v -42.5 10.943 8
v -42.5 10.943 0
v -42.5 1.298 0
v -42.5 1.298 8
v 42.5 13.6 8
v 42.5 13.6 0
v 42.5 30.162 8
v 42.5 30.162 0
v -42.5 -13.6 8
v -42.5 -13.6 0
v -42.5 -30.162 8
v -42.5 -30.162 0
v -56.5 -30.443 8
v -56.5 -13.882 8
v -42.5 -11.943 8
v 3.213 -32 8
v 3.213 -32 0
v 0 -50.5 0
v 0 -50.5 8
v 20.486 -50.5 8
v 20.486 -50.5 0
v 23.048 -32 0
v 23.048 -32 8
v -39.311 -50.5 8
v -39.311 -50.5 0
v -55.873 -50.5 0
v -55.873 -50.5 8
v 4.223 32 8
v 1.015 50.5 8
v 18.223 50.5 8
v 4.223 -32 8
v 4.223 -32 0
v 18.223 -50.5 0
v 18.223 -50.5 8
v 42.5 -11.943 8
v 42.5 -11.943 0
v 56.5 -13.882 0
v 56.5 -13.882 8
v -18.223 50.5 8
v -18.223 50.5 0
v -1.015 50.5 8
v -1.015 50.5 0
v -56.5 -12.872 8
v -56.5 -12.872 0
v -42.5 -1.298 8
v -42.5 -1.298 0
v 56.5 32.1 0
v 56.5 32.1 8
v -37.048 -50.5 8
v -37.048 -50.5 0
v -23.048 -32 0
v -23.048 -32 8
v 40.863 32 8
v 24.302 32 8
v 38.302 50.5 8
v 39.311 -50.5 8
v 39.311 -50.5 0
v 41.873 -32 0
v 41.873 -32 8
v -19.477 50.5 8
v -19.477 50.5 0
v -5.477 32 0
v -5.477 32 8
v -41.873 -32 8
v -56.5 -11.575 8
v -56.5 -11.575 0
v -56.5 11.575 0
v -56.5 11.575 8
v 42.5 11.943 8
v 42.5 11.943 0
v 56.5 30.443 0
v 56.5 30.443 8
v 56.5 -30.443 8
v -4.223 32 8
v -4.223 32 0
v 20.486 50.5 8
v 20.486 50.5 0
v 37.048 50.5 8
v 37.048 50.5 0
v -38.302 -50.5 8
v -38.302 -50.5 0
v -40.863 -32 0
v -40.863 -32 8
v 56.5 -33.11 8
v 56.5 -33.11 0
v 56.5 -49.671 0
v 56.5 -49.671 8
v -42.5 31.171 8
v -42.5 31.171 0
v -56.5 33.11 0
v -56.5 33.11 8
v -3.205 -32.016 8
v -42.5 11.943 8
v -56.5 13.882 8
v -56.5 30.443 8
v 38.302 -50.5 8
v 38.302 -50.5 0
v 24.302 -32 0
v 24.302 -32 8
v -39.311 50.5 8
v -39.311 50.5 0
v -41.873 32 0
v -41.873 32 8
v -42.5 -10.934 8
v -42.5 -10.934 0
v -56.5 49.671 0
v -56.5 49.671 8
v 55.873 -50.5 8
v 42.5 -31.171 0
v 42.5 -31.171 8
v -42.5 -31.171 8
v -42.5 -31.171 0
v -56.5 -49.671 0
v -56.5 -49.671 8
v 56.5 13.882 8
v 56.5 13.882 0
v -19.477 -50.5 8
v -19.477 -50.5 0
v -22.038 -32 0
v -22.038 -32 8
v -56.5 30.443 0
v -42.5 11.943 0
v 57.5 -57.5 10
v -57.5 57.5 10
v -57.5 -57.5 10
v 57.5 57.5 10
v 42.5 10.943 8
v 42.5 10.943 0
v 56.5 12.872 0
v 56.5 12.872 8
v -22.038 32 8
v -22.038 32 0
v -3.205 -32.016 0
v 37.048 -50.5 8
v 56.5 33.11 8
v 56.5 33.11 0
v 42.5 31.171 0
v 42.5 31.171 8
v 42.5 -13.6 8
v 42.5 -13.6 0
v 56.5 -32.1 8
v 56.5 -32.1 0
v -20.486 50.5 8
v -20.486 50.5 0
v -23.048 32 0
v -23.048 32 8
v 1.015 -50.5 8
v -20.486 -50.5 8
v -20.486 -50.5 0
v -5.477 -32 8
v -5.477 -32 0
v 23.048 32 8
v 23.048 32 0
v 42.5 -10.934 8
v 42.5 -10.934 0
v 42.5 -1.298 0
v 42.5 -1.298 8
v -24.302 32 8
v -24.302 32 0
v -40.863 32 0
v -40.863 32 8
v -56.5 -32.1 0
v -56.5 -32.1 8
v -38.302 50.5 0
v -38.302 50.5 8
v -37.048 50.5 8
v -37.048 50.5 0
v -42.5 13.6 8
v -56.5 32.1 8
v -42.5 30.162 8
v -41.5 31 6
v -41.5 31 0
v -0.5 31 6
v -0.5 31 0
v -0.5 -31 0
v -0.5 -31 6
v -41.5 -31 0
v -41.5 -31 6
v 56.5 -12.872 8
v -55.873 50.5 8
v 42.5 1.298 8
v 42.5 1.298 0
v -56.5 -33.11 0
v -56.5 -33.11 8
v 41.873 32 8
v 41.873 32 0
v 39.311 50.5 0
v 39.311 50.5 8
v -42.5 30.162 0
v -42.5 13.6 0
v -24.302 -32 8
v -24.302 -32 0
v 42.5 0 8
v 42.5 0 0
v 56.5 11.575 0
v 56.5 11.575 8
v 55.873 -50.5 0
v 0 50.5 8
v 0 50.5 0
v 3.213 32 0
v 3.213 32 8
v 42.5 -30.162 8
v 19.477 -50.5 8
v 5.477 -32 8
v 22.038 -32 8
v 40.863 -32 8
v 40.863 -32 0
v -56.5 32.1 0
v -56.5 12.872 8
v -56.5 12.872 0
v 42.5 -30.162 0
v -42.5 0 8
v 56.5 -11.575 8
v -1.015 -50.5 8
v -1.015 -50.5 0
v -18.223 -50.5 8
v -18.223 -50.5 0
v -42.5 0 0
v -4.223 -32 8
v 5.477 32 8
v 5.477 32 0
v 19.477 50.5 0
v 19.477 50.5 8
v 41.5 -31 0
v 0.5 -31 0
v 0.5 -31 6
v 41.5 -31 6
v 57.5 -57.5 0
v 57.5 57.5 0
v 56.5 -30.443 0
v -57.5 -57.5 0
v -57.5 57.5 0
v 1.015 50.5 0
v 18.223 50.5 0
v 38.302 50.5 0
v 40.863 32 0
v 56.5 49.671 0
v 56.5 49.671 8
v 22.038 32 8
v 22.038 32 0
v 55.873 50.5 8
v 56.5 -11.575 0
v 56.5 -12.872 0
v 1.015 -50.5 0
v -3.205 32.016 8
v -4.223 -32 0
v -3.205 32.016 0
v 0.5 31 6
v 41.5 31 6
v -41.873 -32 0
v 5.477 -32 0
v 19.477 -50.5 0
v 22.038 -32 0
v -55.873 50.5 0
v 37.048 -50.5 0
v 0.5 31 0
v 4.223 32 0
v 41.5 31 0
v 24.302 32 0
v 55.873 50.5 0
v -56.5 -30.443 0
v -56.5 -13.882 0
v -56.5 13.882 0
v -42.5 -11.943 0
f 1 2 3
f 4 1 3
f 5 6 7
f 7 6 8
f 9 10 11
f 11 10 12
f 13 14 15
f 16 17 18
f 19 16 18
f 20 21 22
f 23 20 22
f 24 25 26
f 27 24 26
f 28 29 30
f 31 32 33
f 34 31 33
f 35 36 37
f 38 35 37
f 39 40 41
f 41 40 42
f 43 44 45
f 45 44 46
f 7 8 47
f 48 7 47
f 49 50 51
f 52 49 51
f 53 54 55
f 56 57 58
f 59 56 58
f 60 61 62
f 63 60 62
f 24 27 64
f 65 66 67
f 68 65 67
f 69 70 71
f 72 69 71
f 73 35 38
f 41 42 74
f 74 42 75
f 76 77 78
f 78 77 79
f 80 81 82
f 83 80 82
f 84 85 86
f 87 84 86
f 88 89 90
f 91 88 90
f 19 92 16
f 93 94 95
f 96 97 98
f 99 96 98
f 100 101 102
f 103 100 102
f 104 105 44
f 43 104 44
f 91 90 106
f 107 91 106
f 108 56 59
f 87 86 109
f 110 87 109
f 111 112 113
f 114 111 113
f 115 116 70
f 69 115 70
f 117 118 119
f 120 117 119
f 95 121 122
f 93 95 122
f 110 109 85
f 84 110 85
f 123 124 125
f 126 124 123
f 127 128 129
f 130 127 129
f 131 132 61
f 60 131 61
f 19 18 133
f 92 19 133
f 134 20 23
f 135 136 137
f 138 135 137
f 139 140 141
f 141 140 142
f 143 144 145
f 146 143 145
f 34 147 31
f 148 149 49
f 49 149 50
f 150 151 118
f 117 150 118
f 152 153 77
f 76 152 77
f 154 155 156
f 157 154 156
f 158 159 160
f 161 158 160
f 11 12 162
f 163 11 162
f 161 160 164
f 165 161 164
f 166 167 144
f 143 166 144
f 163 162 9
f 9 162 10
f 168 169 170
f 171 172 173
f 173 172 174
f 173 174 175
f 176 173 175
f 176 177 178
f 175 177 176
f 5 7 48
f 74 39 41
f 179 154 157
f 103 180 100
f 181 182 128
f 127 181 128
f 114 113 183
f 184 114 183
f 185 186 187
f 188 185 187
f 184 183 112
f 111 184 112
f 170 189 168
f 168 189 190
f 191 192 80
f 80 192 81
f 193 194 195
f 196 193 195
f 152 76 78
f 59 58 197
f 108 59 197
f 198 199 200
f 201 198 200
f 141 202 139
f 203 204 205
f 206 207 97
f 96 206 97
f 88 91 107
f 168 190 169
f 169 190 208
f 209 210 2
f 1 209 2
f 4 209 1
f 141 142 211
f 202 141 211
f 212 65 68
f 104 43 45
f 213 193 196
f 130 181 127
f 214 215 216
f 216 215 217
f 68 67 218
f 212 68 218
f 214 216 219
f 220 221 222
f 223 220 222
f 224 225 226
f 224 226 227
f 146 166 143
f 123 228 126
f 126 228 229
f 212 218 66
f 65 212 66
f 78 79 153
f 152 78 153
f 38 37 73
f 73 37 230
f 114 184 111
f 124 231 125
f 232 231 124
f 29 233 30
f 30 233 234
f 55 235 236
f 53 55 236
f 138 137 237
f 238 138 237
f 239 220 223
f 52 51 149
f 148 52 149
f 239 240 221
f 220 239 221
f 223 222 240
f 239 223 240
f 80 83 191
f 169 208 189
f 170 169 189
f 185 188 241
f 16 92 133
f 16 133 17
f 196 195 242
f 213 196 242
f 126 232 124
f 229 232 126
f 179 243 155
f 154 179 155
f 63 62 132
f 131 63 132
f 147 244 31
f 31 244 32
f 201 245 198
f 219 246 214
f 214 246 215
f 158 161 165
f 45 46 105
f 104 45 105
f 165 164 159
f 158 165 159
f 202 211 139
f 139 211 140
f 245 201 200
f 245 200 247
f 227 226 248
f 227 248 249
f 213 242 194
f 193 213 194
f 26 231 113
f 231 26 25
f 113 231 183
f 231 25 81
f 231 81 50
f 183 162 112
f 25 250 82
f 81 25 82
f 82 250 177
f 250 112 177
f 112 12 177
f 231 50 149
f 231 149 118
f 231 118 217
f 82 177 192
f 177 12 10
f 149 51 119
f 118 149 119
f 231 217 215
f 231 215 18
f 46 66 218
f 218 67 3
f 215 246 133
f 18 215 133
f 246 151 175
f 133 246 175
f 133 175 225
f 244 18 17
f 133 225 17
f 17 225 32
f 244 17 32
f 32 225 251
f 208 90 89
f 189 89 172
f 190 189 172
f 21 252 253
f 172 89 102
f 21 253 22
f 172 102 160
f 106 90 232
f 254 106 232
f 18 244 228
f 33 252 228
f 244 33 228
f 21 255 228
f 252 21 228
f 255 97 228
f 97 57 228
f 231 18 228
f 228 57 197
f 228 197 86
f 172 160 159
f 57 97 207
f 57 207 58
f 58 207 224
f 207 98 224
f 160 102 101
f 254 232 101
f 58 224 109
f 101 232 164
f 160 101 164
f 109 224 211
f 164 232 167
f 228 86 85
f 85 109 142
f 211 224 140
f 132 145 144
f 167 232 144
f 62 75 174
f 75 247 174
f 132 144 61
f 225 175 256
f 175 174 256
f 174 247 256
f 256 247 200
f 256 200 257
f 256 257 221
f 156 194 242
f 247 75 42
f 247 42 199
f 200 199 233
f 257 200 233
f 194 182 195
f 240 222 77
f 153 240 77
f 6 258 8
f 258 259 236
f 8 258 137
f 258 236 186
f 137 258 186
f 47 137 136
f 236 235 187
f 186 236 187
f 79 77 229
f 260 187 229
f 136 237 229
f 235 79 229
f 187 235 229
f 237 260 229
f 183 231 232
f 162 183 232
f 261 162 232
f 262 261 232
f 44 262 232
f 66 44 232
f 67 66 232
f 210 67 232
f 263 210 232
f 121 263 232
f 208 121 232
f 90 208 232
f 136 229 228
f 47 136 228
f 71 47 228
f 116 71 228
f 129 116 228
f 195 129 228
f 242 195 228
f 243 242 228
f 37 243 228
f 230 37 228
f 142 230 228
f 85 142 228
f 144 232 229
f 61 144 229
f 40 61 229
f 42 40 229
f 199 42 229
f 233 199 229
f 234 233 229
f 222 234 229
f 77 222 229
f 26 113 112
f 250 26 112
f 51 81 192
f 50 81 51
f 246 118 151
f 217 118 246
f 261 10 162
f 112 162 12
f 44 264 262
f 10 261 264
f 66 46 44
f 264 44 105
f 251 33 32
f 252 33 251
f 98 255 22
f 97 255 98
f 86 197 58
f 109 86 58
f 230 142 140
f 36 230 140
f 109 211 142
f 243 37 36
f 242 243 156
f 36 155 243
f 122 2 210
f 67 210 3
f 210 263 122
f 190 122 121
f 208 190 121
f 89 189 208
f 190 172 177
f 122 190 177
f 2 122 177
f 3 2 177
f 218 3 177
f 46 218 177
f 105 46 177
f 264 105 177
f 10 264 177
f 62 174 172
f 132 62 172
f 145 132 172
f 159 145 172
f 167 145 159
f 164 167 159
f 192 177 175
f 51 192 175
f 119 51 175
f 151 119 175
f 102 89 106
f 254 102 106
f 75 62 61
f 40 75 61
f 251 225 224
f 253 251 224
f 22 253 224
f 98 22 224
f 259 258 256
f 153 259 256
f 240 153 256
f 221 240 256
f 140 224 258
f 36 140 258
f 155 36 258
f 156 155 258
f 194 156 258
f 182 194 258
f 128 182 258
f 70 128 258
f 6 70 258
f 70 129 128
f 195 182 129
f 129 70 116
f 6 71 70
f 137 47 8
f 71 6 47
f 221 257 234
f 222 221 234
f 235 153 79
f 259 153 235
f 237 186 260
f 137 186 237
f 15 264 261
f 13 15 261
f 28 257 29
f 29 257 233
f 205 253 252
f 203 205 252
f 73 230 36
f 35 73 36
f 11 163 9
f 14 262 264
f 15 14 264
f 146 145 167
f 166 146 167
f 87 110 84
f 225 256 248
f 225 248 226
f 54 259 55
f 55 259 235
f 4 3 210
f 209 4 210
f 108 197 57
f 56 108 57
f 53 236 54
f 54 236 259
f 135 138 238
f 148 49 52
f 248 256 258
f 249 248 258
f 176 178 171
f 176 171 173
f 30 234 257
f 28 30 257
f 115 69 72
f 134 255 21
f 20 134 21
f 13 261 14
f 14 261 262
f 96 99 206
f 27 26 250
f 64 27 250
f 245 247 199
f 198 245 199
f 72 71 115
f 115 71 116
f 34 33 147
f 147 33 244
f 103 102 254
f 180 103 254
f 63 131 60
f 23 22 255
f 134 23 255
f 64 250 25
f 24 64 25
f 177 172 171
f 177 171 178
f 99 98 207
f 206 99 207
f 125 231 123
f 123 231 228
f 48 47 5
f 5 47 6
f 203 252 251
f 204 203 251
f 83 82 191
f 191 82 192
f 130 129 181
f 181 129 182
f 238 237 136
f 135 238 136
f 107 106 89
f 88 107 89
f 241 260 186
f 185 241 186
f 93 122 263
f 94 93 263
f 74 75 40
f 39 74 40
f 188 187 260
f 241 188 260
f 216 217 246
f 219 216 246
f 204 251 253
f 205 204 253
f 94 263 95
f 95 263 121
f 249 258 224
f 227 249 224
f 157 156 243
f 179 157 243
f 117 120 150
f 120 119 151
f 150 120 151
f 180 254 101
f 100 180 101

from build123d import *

# Parameters (mm, degrees)
F0_W     = 115
F0_H     = 115
F1_DEPTH = 10
F2_W     = 83
F2_H     = 62
F3_DEPTH = 6
F4_W     = 1
F4_H     = 62
F5_DEPTH = 6
F7_DEPTH = 8


# Not quite as in the source:
# - a feature of the source that left no trace in its solid (it failed there, or was rolled back) is left out


with BuildPart() as f1:
    # F0 (on Top) → F1 (new body)
    with BuildSketch(Plane.XY):
        Rectangle(F0_W, F0_H)
    extrude(amount=F1_DEPTH)

    # F2 (on face) → F3 (cut)
    with BuildSketch(Plane(origin=(0, 0, 0), x_dir=(1, 0, 0), z_dir=(0, 0, -1))):
        Rectangle(F2_W, F2_H)
    extrude(amount=-F3_DEPTH, mode=Mode.SUBTRACT)

    # F4 (on face) → F5 (join)
    with BuildSketch(Plane(origin=(0, 0, 0), x_dir=(1, 0, 0), z_dir=(0, 0, -1))):
        Rectangle(F4_W, F4_H)
    extrude(amount=-F5_DEPTH)

    # F6 (on face) → F7 (cut)
    with BuildSketch(Plane(origin=(0, 0, 0), x_dir=(1, 0, 0), z_dir=(0, 0, -1))):
        Polygon((-39.3114286867, 50.5), (-55.8729671482, 50.5), (-41.8729671482, 32), align=None)
        Polygon((-56.5, 33.1098824129), (-42.5, 31.1714208744), (-56.5, 49.6714208744), align=None)
        Polygon((-38.3018883964, 50.5), (-40.863426858, 32), (-24.3018883964, 32), align=None)
        Polygon((-20.4862842313, 50.5), (-37.0478226928, 50.5), (-23.0478226928, 32), align=None)
        Polygon((-19.4767439411, 50.5), (-22.0382824026, 32), (-5.4767439411, 32), align=None)
        Polygon((-1.0149211209, 50.5), (-18.2226782375, 50.5), (-4.2226782375, 32), align=None)
        Polygon((0, 50.5), (-3.2050376771, 32.0156837407), (3.2131379472, 32), align=None)
        Polygon((4.2226782375, 32), (18.2226782375, 50.5), (1.0149211209, 50.5), align=None)
        Polygon((22.0382824026, 32), (19.4767439411, 50.5), (5.4767439411, 32), align=None)
        Polygon((20.4862842313, 50.5), (23.0478226928, 32), (37.0478226928, 50.5), align=None)
        Polygon((40.863426858, 32), (38.3018883964, 50.5), (24.3018883964, 32), align=None)
        Polygon((39.3114286867, 50.5), (41.8729671482, 32), (55.8729671482, 50.5), align=None)
        Polygon((56.5, 49.6714208744), (42.5, 31.1714208744), (56.5, 33.1098824129), align=None)
        Polygon((-42.5, 13.6003421226), (-42.5, 30.1618805842), (-56.5, 32.1003421226), align=None)
        Polygon((-42.5, 11.9431838715), (-56.5, 30.4431838715), (-56.5, 13.8816454099), align=None)
        Polygon((-42.5, 1.2975080085), (-42.5, 10.9336435812), (-56.5, 12.8721051197), align=None)
        Polygon((-56.5, -13.8816454099), (-56.5, -30.4431838715), (-42.5, -11.9431838715), align=None)
        Polygon((-42.5, -13.6003421226), (-56.5, -32.1003421226), (-42.5, -30.1618805842), align=None)
        Polygon((-56.5, -49.6714208744), (-42.5, -31.1714208744), (-56.5, -33.1098824129), align=None)
        Polygon((-41.8729671482, -32), (-55.8729671482, -50.5), (-39.3114286867, -50.5), align=None)
        Polygon((56.5, 32.1003421226), (42.5, 30.1618805842), (42.5, 13.6003421226), align=None)
        Polygon((42.5, 11.9431838715), (56.5, 13.8816454099), (56.5, 30.4431838715), align=None)
        Polygon((56.5, -13.8816454099), (42.5, -11.9431838715), (56.5, -30.4431838715), align=None)
        Polygon((42.5, -30.1618805842), (56.5, -32.1003421226), (42.5, -13.6003421226), align=None)
        Polygon((56.5, -33.1098824129), (42.5, -31.1714208744), (56.5, -49.6714208744), align=None)
        Polygon((39.3114286867, -50.5), (55.8729671482, -50.5), (41.8729671482, -32), align=None)
        Polygon((-38.3018883964, -50.5), (-24.3018883964, -32), (-40.863426858, -32), align=None)
        Polygon((-23.0478226928, -32), (-37.0478226928, -50.5), (-20.4862842313, -50.5), align=None)
        Polygon((-5.4767439411, -32), (-22.0382824026, -32), (-19.4767439411, -50.5), align=None)
        Polygon((-4.2226782375, -32), (-18.2226782375, -50.5), (-1.0149211209, -50.5), align=None)
        Polygon((1.0149211209, -50.5), (18.2226782375, -50.5), (4.2226782375, -32), align=None)
        Polygon((5.4767439411, -32), (19.4767439411, -50.5), (22.0382824026, -32), align=None)
        Polygon((37.0478226928, -50.5), (23.0478226928, -32), (20.4862842313, -50.5), align=None)
        Polygon((24.3018883964, -32), (38.3018883964, -50.5), (40.863426858, -32), align=None)
        Polygon((3.2131379472, -32), (-3.2050376771, -32.0156837407), (0, -50.5), align=None)
        Polygon((56.5, 12.8721051197), (42.5, 10.9336435812), (42.5, 1.2975080085), align=None)
        Polygon((-42.5, 0), (-56.5, 11.5745971112), (-56.5, -11.5745971112), align=None)
        Polygon((56.5, -11.5745971112), (56.5, 11.5745971112), (42.5, 0), align=None)
        Polygon((-42.5, -10.9431838715), (-42.5, -1.2975080085), (-56.5, -12.8721051197), align=None)
        Polygon((42.5, -10.9431838715), (56.5, -12.8721051197), (42.5, -1.2975080085), align=None)
    extrude(amount=-F7_DEPTH, mode=Mode.SUBTRACT)


solid = f1.part
